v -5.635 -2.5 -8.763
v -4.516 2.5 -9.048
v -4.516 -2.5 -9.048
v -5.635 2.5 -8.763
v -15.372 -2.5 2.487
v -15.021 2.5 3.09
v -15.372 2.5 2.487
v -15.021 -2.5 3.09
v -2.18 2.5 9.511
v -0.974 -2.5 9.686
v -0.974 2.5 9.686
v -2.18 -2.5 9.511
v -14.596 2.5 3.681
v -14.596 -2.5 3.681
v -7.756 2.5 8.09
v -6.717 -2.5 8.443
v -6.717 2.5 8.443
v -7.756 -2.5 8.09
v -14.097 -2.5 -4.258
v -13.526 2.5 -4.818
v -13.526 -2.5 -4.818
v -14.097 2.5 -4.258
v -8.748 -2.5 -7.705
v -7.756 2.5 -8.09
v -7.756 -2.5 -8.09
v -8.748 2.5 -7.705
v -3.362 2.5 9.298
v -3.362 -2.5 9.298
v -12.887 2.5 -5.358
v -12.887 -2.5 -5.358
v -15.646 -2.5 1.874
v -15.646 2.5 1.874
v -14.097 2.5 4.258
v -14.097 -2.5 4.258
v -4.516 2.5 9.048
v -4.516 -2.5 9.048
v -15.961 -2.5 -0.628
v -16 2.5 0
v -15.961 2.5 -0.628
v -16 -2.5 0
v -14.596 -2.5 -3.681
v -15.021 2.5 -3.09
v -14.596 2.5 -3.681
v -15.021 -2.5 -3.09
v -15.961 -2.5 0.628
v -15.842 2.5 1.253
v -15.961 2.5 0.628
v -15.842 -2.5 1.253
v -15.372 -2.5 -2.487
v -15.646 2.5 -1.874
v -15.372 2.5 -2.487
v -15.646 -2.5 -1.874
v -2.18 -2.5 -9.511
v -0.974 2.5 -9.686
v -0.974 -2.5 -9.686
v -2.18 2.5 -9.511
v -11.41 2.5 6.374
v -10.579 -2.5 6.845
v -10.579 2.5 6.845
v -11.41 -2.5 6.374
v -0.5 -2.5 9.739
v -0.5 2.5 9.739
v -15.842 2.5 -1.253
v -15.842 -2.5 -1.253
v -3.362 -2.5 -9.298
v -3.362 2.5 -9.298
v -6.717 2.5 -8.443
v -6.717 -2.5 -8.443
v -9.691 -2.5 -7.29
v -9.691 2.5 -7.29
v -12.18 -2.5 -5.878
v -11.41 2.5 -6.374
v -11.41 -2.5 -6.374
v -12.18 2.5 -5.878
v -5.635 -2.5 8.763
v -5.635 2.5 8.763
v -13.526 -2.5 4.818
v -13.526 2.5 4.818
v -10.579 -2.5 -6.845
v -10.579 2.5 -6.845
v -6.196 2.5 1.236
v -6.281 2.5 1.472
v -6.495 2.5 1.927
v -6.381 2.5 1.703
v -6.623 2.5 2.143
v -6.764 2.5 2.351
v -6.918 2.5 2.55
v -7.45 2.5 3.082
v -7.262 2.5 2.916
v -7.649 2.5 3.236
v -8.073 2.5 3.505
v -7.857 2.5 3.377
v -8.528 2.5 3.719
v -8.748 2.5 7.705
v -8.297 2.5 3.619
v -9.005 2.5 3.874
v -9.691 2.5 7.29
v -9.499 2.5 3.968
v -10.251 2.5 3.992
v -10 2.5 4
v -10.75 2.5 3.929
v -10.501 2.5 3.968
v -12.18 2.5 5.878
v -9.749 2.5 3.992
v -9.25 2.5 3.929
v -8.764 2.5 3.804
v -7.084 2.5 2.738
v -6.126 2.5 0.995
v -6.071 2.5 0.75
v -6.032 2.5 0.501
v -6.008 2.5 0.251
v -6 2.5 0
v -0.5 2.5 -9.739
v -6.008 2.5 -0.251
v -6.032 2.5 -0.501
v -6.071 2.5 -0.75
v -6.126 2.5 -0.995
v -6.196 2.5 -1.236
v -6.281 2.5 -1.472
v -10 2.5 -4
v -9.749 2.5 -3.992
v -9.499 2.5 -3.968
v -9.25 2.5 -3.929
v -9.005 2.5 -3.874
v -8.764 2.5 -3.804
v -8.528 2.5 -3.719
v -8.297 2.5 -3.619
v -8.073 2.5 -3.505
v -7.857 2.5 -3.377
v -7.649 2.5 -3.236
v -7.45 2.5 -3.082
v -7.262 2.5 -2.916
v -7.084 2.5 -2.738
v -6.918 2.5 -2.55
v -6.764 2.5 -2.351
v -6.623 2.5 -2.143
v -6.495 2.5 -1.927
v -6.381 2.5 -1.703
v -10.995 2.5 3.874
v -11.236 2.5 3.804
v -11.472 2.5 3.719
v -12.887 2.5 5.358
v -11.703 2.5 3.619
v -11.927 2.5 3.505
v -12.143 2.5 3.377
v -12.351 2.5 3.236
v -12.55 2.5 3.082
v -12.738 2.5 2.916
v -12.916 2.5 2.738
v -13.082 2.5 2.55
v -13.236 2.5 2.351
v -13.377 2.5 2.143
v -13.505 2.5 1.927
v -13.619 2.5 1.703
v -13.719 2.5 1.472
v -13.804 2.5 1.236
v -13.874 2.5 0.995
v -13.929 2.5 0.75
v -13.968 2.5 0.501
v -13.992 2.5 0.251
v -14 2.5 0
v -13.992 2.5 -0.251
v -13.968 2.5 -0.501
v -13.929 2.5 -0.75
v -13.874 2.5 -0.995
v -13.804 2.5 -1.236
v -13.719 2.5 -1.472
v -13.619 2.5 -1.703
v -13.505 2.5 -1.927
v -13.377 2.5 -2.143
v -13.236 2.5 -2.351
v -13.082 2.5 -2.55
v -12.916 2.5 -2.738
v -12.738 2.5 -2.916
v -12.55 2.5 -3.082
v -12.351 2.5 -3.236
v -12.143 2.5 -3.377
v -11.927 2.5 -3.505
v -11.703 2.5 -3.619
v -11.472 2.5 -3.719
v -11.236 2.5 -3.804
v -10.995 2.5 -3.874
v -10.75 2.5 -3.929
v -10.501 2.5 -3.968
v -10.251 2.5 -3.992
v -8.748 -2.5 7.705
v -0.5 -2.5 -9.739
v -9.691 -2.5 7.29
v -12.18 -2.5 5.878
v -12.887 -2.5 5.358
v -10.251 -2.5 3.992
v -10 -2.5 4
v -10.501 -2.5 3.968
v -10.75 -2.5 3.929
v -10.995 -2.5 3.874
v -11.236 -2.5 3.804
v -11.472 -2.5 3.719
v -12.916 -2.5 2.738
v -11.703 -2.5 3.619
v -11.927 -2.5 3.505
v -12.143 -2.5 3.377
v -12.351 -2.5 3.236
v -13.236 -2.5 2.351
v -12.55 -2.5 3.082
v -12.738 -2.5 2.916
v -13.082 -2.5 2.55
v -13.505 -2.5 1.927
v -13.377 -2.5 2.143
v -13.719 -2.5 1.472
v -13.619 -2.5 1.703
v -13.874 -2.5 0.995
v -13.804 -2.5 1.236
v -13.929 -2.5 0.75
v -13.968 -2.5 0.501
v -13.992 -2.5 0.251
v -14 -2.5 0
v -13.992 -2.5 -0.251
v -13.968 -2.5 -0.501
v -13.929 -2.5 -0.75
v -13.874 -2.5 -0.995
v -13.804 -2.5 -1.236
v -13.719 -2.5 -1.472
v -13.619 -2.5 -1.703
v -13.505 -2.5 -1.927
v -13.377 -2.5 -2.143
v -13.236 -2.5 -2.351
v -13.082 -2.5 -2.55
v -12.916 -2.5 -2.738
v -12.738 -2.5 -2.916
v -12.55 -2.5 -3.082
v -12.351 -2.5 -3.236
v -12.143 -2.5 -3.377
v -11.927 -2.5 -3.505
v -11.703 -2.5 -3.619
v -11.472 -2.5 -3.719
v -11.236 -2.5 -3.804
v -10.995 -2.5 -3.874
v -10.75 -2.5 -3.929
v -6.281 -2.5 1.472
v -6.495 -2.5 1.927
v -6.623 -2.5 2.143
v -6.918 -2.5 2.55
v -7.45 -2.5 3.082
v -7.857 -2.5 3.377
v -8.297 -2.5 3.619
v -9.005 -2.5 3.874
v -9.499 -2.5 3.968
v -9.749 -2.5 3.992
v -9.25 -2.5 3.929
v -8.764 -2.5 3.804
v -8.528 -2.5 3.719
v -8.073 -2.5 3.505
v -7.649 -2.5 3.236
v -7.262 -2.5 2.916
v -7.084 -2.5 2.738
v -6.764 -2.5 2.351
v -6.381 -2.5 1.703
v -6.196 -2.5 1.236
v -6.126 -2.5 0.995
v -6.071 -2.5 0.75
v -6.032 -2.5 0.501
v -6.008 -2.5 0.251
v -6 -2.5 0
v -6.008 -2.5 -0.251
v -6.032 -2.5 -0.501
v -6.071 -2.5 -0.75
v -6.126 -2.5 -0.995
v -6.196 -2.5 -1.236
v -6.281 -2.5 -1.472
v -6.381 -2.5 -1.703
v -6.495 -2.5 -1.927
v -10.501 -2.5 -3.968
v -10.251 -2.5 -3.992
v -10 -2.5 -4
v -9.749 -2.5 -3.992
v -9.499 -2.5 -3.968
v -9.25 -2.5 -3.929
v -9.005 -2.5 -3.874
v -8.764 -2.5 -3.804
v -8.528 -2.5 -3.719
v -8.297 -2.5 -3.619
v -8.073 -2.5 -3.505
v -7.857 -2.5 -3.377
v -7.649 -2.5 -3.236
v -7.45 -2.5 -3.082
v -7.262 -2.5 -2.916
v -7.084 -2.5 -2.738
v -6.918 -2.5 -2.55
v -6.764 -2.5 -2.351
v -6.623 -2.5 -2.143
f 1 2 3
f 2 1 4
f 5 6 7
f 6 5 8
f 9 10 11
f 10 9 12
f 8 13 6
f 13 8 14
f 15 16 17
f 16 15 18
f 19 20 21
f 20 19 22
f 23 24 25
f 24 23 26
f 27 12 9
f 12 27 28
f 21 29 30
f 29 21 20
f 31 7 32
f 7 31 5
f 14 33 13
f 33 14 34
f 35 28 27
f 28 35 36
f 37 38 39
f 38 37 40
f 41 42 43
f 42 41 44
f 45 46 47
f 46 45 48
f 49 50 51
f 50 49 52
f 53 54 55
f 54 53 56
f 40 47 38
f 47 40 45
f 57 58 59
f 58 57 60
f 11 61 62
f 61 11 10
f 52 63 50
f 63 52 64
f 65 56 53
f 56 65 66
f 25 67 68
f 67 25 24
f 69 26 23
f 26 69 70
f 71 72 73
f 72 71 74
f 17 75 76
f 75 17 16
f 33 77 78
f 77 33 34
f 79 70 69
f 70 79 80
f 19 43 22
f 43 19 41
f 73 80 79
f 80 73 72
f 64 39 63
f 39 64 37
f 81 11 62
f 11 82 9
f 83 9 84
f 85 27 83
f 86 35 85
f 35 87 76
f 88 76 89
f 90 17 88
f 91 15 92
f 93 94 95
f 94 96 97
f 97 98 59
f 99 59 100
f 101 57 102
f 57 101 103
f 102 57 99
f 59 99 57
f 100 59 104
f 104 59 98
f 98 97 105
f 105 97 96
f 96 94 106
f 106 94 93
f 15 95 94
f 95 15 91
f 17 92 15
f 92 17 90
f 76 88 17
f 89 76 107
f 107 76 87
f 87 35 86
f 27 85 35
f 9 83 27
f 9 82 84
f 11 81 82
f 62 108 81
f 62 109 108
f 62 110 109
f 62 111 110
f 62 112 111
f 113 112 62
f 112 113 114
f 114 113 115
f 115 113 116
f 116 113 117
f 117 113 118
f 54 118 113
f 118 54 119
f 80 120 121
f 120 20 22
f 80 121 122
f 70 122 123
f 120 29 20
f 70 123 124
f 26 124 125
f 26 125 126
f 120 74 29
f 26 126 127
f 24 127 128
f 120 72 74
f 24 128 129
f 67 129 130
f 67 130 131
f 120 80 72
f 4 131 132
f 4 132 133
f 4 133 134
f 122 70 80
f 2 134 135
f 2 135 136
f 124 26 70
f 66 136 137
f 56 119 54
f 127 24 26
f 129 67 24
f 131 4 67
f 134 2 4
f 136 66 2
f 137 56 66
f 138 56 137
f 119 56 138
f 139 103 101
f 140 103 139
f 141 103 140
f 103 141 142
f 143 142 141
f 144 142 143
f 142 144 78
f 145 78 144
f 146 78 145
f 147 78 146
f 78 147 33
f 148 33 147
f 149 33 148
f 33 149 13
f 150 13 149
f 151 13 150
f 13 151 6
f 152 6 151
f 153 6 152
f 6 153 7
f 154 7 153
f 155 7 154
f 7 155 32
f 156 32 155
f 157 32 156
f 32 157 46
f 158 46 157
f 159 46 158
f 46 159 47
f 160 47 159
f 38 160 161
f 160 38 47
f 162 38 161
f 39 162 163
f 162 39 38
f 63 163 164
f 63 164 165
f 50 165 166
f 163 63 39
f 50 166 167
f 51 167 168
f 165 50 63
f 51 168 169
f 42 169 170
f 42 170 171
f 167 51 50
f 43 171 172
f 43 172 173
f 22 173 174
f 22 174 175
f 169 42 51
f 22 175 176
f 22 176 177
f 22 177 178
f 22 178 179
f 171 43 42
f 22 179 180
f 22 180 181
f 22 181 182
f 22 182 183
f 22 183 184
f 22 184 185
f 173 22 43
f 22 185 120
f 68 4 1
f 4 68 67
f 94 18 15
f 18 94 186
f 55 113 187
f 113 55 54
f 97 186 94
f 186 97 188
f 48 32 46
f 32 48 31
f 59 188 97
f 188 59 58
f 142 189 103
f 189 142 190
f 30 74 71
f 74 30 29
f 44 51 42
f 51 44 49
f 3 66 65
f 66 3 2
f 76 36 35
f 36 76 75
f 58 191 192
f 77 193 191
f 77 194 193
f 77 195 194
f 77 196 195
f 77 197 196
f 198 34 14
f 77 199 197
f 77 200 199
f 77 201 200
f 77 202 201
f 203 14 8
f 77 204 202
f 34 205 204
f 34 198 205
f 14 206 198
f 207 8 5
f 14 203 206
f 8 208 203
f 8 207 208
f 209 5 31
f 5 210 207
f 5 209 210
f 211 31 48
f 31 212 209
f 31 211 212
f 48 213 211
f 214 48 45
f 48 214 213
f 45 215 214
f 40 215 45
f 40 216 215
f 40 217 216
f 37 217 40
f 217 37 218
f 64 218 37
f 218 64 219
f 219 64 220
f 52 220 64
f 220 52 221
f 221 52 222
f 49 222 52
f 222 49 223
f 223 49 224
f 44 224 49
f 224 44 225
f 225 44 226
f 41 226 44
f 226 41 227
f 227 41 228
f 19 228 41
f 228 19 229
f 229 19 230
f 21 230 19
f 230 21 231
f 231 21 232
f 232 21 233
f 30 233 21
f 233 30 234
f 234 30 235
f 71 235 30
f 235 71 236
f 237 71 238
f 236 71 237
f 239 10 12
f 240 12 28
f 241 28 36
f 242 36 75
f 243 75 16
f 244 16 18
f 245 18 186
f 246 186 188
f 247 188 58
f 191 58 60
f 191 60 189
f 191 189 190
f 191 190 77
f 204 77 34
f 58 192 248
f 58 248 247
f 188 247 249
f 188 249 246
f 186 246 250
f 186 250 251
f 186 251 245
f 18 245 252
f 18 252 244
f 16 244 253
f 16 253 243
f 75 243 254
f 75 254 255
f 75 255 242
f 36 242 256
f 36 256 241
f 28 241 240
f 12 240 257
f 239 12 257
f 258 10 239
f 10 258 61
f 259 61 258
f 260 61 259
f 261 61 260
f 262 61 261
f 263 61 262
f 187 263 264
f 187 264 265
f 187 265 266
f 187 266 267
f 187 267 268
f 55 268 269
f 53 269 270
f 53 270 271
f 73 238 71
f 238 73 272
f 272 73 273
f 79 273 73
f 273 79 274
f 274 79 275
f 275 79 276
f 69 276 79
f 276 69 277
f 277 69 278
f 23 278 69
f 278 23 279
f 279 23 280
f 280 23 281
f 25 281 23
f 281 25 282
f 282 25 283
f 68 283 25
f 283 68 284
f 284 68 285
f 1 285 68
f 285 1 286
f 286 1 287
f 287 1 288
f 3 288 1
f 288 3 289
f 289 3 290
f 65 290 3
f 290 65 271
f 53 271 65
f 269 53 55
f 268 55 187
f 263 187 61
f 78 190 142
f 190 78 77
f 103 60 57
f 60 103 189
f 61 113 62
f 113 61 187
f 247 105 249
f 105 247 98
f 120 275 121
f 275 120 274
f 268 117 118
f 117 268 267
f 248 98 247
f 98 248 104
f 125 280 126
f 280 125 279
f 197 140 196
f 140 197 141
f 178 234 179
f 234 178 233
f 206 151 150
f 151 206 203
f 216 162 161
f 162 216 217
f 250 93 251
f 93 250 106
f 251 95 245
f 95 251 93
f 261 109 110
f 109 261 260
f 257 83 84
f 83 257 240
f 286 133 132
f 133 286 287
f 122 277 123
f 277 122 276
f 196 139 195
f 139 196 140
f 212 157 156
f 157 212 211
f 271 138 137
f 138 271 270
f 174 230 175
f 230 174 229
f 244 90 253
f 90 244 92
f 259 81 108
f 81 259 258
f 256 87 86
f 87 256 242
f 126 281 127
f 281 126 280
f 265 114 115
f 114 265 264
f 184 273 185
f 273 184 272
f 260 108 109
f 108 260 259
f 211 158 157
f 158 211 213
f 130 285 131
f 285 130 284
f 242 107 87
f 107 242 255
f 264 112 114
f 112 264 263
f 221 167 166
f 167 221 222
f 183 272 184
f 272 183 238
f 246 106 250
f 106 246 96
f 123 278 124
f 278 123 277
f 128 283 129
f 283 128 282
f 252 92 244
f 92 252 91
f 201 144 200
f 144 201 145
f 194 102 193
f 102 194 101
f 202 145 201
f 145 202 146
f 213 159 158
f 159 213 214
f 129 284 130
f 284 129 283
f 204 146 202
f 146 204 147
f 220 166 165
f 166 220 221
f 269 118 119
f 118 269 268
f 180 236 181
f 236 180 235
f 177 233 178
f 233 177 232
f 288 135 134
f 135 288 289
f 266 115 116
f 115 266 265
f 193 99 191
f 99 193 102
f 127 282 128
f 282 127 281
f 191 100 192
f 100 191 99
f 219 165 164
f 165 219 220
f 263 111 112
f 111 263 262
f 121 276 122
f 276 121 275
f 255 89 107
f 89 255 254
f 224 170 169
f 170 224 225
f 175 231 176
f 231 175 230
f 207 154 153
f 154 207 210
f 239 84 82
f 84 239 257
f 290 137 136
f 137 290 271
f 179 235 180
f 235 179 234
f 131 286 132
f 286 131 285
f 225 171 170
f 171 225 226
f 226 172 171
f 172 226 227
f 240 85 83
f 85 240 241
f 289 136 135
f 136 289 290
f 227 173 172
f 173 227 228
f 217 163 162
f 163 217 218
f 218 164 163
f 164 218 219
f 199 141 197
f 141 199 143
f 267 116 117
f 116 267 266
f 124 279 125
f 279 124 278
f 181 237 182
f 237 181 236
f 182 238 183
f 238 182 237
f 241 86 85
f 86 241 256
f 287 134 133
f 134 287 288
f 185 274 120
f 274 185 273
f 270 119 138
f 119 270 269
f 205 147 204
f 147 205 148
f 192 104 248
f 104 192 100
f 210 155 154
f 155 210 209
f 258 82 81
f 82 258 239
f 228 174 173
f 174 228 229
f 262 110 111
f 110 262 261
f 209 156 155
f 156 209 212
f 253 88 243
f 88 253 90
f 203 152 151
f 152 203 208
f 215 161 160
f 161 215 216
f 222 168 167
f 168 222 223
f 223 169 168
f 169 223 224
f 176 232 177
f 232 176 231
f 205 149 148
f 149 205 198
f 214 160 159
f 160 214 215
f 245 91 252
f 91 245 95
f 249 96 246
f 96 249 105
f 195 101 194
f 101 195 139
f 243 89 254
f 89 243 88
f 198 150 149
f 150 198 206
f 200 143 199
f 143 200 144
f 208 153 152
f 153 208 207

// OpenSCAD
generic_mount(0,0,0);
module generic_mount(x,y,z)
{

translate([x,y,z])difference()
{
translate([x+4, 0 ,0])rotate([90,90,0])difference()	
{
scale([1,2,1])cylinder(h=5, r=10, center=true); $fn=500;
translate([0,8,0])cube([20,25,5], center=true); $fn=100;
}







translate([y-10,0 ,0])rotate([90,90,0])cylinder(h=6, r=4, center=true);$fn=100;
} 

//translate([x+14,0,0])cube([20,5,20], center=true); $fn=100;}




}
